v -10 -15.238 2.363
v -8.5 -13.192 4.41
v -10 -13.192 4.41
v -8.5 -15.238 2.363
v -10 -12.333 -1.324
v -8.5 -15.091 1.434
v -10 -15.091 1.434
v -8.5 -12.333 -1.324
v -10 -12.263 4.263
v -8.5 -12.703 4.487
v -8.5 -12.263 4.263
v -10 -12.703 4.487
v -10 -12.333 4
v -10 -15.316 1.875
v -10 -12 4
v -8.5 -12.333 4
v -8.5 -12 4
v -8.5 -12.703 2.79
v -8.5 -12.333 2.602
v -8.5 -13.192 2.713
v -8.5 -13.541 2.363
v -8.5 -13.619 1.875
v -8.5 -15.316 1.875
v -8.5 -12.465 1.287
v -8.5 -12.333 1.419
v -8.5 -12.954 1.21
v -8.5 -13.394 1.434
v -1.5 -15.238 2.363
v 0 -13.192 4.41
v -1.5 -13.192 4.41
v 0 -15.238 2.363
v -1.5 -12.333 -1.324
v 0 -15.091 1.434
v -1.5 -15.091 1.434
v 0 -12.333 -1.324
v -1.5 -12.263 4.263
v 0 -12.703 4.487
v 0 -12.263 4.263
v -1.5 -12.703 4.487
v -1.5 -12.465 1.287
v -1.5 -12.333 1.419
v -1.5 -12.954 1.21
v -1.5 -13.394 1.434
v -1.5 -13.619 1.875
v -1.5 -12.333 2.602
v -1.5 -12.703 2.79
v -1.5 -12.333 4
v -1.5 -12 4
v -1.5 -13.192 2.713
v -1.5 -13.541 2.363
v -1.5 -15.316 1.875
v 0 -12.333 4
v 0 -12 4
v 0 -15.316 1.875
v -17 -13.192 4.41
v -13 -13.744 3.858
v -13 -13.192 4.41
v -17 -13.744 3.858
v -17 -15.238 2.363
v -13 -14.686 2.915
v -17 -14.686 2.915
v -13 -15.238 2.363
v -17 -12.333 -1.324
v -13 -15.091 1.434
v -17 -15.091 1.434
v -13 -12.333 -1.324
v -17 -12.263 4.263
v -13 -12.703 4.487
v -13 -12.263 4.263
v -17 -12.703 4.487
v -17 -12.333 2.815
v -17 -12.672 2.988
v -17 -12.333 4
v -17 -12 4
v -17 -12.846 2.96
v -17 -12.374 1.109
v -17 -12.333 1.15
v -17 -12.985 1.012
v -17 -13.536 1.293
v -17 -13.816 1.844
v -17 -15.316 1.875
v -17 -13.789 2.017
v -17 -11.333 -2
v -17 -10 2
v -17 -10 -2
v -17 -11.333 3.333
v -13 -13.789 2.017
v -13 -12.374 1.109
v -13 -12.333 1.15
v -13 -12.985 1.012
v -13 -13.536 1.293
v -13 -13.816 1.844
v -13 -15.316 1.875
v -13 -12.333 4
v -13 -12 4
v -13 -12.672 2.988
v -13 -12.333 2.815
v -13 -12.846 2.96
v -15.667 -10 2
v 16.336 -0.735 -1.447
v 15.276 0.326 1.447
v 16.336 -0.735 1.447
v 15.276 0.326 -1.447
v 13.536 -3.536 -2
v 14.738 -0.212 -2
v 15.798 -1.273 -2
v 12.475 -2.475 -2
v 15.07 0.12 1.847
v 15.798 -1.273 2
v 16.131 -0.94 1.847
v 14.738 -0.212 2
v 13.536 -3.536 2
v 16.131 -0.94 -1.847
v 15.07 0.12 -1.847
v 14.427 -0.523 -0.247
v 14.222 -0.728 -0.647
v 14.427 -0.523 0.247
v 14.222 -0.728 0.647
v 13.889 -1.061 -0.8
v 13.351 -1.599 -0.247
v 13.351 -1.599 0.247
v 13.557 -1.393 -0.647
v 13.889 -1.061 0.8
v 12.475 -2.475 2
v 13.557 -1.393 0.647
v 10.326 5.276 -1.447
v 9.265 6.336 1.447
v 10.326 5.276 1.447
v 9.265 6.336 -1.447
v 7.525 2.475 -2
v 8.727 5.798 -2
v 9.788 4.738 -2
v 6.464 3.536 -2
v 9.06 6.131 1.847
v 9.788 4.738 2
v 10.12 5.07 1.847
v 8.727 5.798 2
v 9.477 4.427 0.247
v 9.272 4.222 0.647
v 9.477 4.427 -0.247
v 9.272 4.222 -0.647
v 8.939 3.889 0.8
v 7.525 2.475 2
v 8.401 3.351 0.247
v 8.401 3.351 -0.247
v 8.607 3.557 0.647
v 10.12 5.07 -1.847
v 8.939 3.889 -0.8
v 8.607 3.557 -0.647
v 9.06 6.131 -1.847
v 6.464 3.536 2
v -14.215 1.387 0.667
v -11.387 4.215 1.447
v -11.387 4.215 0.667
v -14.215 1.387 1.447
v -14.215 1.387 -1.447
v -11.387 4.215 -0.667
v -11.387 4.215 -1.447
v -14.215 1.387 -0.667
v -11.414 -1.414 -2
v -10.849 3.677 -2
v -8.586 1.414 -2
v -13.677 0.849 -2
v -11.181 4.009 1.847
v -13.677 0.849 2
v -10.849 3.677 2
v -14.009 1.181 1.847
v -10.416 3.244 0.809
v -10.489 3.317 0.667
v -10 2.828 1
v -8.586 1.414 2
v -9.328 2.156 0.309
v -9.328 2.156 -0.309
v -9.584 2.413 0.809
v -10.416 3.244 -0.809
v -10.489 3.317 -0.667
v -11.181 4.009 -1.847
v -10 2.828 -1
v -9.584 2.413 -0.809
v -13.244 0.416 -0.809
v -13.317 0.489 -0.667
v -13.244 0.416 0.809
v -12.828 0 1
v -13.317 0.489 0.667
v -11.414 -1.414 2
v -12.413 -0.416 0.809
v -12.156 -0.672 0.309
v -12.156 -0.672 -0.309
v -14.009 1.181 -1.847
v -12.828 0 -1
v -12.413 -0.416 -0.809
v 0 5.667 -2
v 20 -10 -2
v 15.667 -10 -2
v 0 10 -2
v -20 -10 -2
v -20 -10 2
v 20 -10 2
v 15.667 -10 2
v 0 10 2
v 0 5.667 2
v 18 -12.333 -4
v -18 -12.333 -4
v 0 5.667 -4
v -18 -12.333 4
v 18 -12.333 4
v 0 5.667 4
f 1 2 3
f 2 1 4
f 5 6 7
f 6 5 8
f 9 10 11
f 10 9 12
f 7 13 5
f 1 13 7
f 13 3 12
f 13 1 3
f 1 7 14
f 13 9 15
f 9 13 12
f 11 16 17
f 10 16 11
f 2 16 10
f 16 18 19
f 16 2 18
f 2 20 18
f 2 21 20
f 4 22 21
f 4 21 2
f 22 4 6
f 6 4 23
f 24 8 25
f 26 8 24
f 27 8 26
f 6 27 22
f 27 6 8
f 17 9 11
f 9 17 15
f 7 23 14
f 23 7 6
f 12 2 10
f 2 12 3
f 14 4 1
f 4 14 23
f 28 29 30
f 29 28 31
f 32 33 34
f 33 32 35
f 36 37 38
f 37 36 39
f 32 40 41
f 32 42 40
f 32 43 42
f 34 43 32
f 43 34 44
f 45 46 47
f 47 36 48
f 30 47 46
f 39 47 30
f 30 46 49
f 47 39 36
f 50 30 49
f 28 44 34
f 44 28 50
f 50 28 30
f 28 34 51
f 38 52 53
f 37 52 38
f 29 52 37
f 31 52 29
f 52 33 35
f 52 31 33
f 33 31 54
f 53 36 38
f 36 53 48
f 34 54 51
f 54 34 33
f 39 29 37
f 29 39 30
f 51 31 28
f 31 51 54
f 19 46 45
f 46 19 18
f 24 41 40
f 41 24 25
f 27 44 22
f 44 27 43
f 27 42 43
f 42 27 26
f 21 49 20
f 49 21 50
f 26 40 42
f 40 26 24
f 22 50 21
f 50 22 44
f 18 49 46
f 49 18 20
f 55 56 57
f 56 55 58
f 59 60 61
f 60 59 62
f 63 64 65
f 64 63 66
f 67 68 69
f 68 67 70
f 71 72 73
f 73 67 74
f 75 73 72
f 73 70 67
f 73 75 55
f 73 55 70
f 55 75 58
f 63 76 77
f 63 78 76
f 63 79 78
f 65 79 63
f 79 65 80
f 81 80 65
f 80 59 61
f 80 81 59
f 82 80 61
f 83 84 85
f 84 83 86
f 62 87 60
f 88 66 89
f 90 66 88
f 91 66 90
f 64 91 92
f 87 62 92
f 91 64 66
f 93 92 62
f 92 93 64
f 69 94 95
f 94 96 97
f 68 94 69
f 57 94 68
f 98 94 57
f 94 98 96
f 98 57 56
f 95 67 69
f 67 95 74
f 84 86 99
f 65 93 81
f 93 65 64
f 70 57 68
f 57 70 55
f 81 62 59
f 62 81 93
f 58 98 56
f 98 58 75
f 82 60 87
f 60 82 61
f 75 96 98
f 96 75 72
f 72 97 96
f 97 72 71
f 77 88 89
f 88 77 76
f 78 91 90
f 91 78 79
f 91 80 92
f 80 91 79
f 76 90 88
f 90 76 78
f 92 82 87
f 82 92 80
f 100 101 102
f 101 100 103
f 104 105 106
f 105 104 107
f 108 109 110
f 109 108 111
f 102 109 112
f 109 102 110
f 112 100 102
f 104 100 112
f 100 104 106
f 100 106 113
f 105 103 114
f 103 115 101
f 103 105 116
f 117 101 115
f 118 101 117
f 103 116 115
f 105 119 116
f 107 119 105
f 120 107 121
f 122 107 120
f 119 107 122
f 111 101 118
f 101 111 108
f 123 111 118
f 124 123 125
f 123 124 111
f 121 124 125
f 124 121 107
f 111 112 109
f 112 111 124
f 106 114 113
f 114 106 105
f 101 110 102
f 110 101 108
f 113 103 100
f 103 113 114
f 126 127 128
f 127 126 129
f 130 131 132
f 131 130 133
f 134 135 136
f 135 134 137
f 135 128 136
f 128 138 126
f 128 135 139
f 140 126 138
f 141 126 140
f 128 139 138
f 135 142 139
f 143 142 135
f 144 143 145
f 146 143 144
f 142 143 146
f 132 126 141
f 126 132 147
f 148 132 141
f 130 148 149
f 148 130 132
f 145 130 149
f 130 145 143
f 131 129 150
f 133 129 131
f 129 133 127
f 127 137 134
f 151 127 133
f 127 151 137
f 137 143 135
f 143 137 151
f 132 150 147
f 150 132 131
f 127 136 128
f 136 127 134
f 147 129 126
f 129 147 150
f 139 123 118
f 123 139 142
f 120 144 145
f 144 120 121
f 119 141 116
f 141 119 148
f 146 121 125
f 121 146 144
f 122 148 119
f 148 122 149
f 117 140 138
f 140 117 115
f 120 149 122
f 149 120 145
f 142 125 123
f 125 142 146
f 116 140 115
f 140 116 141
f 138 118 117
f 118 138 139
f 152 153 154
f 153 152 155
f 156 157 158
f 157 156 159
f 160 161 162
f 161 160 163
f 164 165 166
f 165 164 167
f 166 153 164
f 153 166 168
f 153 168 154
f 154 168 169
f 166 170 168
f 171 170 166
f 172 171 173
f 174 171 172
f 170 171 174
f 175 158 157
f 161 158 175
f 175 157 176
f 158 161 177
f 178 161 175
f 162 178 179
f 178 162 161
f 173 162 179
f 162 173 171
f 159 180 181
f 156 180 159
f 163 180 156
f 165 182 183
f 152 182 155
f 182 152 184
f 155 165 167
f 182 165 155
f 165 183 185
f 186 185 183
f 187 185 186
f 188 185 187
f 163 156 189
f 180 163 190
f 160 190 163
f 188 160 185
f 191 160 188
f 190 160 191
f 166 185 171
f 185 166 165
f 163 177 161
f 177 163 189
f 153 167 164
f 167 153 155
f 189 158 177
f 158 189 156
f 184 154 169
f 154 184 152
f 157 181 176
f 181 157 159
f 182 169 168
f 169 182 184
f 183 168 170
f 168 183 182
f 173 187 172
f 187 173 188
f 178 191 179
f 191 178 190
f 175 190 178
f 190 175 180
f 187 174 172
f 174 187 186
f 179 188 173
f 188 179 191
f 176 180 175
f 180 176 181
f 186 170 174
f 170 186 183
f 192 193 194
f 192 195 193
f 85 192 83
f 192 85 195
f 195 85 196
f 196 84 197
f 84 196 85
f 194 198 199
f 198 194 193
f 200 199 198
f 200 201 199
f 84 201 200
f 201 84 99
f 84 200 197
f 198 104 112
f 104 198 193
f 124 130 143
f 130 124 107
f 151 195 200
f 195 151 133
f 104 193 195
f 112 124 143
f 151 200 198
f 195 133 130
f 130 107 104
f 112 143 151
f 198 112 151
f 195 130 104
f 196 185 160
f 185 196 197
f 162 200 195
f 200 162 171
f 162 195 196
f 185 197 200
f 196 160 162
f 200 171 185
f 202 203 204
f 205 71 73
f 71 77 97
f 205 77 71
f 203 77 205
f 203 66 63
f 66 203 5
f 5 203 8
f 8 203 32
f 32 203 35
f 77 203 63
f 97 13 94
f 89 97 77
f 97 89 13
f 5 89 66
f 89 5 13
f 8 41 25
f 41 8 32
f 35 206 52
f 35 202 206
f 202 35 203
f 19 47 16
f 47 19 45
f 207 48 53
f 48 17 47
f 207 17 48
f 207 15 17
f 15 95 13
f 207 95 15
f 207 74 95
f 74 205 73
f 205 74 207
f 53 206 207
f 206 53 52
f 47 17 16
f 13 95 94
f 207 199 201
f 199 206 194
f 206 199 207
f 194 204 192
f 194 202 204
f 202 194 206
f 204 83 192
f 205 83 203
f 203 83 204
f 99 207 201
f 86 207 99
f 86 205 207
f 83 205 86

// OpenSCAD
$fn = 10;
triangleSide = 40; // Triangle side size
triangleThickness = 4; // Triagle thickness
corner = 0.8;
hollow = true;

function pitagor(a, b) = sqrt(pow(a, 2) + pow(b, 2));


//
// --- hinge
module hinge(){
  width = triangleSide/4;
  size = triangleThickness;
  side = width/6*0.9;
  echo(side);
    
  hull() {
    translate([-(width/2)+side/2, side*2, 0]) {
      cube([side, size, size], center=true);
    }
    translate([-(width/2)+side/2, -size/2+corner, size/2-corner]) {
      rotate(90, [0,1,0]) {
        cylinder(h=side, r=corner, center=true);
      }
    }
    translate([-(width/2)+side/2, -size/2+corner, -size/2+corner]) {
      rotate(90, [0,1,0]) {
        cylinder(h=side, r=corner, center=true);
      }
    }
  }
  hull() {
    translate([width/2-side/2, side*2, 0]) {
      cube([side, size, size], center=true);
    } 
    translate([width/2-side/2, -size/2+corner, size/2-corner]) {
      rotate(90, [0,1,0]) {
        cylinder(h=side, r=corner, center=true);
      }
    }
    translate([width/2-side/2, -size/2+corner, -size/2+corner]) {
      rotate(90, [0,1,0]) {
        cylinder(h=side, r=corner, center=true);
      }
    }
  }
  rotate(90, [0,1,0]) {
    cylinder(h=width, r=size/2*0.8/2, center=true);
  }
} 

//
// --- clip
module clip(){
  width = triangleSide/4;
  size = triangleThickness;
    
  difference() {
    hull() {
      translate([0, size, 0]) {
        cube([size, size, size], center=true);
      }
      translate([0, -size/2+corner, size/2-corner]) {
        rotate(90, [0,1,0]) {
          cylinder(h=size, r=corner, center=true);
        }
      }
      translate([0, -size/2+corner, -size/2+corner]) {
        rotate(90, [0,1,0]) {
          cylinder(h=size, r=corner, center=true);
        }
      }
    }
    translate([0, -size/2, 0]) {
      cube([width*0.9, size, size/3], center=true);
    }
    rotate(90, [0,1,0]) {
      cylinder(h=width*0.9, r=size/2*1/2, center=true);
    }
  }
}
//
// --- triangle
module triangle(){
  translate([0, 0, -triangleThickness/2]) {
    linear_extrude(triangleThickness) {
      polygon([[-triangleSide/2, -triangleSide/4], [0, triangleSide/4], [triangleSide/2, -triangleSide/4]]);
    }
  }
}
//
// --- part itself
module part() {
  color("LimeGreen", 1.0) {
    difference() {
      union(){
        triangle();
        translate([-triangleSide/8, -triangleSide/4, 0]) {
          translate([0, 0, triangleThickness/2]) {
            rotate(-45, [1, 0, 0]) {
              translate([0, -triangleThickness/2, -triangleThickness/2]) {
                hinge();
              }
            }
          }
        }
        translate([-triangleSide/8*3, -triangleSide/4, 0]) {
          translate([0, 0, triangleThickness/2]) {
            rotate(-45, [1, 0, 0]) {
              translate([0, -triangleThickness/2, -triangleThickness/2]) {
                clip();
              }
            }
          }
        }
        translate([triangleSide/4, 0, 0]) {
          rotate(135, [0, 0, 1]) {
            translate([0, -triangleThickness/2, 0]) {
              hinge();
            }
          }
        }
        translate([-triangleSide/4, 0, 0]) {
          rotate(-135, [0, 0, 1]) {
            translate([0, -triangleThickness/2, 0]) {
              clip();
            }
          }
        }
      }
      translate([0, 0, -triangleThickness]) {
        cube([triangleSide*2, triangleSide*2, triangleThickness], center=true);
      }
    }
  }
}
//
// --- demo assembly
module assembly() {
  translate([0, triangleSide/2/2 + pitagor(triangleThickness, triangleThickness) / 2, -triangleThickness/2]) {
    part();
  }

  rotate(18, [1,0,0]) {
    translate([-triangleSide/2, triangleSide/2/2 + pitagor(triangleThickness, triangleThickness) / 2, triangleThickness/2]) {
      rotate(180, [0,0,1]) {
        rotate(180, [1,0,0]) {
          part();
        }
      }
    }
  }
}

      translate([0, -(triangleSide/2/2 - triangleSide/2/3), 0]) {
    scale([0.9, 0.9, 2]) {
        triangle();
      }
    }

part();
//triangle();
//assembly();
//hinge();
//clip();
